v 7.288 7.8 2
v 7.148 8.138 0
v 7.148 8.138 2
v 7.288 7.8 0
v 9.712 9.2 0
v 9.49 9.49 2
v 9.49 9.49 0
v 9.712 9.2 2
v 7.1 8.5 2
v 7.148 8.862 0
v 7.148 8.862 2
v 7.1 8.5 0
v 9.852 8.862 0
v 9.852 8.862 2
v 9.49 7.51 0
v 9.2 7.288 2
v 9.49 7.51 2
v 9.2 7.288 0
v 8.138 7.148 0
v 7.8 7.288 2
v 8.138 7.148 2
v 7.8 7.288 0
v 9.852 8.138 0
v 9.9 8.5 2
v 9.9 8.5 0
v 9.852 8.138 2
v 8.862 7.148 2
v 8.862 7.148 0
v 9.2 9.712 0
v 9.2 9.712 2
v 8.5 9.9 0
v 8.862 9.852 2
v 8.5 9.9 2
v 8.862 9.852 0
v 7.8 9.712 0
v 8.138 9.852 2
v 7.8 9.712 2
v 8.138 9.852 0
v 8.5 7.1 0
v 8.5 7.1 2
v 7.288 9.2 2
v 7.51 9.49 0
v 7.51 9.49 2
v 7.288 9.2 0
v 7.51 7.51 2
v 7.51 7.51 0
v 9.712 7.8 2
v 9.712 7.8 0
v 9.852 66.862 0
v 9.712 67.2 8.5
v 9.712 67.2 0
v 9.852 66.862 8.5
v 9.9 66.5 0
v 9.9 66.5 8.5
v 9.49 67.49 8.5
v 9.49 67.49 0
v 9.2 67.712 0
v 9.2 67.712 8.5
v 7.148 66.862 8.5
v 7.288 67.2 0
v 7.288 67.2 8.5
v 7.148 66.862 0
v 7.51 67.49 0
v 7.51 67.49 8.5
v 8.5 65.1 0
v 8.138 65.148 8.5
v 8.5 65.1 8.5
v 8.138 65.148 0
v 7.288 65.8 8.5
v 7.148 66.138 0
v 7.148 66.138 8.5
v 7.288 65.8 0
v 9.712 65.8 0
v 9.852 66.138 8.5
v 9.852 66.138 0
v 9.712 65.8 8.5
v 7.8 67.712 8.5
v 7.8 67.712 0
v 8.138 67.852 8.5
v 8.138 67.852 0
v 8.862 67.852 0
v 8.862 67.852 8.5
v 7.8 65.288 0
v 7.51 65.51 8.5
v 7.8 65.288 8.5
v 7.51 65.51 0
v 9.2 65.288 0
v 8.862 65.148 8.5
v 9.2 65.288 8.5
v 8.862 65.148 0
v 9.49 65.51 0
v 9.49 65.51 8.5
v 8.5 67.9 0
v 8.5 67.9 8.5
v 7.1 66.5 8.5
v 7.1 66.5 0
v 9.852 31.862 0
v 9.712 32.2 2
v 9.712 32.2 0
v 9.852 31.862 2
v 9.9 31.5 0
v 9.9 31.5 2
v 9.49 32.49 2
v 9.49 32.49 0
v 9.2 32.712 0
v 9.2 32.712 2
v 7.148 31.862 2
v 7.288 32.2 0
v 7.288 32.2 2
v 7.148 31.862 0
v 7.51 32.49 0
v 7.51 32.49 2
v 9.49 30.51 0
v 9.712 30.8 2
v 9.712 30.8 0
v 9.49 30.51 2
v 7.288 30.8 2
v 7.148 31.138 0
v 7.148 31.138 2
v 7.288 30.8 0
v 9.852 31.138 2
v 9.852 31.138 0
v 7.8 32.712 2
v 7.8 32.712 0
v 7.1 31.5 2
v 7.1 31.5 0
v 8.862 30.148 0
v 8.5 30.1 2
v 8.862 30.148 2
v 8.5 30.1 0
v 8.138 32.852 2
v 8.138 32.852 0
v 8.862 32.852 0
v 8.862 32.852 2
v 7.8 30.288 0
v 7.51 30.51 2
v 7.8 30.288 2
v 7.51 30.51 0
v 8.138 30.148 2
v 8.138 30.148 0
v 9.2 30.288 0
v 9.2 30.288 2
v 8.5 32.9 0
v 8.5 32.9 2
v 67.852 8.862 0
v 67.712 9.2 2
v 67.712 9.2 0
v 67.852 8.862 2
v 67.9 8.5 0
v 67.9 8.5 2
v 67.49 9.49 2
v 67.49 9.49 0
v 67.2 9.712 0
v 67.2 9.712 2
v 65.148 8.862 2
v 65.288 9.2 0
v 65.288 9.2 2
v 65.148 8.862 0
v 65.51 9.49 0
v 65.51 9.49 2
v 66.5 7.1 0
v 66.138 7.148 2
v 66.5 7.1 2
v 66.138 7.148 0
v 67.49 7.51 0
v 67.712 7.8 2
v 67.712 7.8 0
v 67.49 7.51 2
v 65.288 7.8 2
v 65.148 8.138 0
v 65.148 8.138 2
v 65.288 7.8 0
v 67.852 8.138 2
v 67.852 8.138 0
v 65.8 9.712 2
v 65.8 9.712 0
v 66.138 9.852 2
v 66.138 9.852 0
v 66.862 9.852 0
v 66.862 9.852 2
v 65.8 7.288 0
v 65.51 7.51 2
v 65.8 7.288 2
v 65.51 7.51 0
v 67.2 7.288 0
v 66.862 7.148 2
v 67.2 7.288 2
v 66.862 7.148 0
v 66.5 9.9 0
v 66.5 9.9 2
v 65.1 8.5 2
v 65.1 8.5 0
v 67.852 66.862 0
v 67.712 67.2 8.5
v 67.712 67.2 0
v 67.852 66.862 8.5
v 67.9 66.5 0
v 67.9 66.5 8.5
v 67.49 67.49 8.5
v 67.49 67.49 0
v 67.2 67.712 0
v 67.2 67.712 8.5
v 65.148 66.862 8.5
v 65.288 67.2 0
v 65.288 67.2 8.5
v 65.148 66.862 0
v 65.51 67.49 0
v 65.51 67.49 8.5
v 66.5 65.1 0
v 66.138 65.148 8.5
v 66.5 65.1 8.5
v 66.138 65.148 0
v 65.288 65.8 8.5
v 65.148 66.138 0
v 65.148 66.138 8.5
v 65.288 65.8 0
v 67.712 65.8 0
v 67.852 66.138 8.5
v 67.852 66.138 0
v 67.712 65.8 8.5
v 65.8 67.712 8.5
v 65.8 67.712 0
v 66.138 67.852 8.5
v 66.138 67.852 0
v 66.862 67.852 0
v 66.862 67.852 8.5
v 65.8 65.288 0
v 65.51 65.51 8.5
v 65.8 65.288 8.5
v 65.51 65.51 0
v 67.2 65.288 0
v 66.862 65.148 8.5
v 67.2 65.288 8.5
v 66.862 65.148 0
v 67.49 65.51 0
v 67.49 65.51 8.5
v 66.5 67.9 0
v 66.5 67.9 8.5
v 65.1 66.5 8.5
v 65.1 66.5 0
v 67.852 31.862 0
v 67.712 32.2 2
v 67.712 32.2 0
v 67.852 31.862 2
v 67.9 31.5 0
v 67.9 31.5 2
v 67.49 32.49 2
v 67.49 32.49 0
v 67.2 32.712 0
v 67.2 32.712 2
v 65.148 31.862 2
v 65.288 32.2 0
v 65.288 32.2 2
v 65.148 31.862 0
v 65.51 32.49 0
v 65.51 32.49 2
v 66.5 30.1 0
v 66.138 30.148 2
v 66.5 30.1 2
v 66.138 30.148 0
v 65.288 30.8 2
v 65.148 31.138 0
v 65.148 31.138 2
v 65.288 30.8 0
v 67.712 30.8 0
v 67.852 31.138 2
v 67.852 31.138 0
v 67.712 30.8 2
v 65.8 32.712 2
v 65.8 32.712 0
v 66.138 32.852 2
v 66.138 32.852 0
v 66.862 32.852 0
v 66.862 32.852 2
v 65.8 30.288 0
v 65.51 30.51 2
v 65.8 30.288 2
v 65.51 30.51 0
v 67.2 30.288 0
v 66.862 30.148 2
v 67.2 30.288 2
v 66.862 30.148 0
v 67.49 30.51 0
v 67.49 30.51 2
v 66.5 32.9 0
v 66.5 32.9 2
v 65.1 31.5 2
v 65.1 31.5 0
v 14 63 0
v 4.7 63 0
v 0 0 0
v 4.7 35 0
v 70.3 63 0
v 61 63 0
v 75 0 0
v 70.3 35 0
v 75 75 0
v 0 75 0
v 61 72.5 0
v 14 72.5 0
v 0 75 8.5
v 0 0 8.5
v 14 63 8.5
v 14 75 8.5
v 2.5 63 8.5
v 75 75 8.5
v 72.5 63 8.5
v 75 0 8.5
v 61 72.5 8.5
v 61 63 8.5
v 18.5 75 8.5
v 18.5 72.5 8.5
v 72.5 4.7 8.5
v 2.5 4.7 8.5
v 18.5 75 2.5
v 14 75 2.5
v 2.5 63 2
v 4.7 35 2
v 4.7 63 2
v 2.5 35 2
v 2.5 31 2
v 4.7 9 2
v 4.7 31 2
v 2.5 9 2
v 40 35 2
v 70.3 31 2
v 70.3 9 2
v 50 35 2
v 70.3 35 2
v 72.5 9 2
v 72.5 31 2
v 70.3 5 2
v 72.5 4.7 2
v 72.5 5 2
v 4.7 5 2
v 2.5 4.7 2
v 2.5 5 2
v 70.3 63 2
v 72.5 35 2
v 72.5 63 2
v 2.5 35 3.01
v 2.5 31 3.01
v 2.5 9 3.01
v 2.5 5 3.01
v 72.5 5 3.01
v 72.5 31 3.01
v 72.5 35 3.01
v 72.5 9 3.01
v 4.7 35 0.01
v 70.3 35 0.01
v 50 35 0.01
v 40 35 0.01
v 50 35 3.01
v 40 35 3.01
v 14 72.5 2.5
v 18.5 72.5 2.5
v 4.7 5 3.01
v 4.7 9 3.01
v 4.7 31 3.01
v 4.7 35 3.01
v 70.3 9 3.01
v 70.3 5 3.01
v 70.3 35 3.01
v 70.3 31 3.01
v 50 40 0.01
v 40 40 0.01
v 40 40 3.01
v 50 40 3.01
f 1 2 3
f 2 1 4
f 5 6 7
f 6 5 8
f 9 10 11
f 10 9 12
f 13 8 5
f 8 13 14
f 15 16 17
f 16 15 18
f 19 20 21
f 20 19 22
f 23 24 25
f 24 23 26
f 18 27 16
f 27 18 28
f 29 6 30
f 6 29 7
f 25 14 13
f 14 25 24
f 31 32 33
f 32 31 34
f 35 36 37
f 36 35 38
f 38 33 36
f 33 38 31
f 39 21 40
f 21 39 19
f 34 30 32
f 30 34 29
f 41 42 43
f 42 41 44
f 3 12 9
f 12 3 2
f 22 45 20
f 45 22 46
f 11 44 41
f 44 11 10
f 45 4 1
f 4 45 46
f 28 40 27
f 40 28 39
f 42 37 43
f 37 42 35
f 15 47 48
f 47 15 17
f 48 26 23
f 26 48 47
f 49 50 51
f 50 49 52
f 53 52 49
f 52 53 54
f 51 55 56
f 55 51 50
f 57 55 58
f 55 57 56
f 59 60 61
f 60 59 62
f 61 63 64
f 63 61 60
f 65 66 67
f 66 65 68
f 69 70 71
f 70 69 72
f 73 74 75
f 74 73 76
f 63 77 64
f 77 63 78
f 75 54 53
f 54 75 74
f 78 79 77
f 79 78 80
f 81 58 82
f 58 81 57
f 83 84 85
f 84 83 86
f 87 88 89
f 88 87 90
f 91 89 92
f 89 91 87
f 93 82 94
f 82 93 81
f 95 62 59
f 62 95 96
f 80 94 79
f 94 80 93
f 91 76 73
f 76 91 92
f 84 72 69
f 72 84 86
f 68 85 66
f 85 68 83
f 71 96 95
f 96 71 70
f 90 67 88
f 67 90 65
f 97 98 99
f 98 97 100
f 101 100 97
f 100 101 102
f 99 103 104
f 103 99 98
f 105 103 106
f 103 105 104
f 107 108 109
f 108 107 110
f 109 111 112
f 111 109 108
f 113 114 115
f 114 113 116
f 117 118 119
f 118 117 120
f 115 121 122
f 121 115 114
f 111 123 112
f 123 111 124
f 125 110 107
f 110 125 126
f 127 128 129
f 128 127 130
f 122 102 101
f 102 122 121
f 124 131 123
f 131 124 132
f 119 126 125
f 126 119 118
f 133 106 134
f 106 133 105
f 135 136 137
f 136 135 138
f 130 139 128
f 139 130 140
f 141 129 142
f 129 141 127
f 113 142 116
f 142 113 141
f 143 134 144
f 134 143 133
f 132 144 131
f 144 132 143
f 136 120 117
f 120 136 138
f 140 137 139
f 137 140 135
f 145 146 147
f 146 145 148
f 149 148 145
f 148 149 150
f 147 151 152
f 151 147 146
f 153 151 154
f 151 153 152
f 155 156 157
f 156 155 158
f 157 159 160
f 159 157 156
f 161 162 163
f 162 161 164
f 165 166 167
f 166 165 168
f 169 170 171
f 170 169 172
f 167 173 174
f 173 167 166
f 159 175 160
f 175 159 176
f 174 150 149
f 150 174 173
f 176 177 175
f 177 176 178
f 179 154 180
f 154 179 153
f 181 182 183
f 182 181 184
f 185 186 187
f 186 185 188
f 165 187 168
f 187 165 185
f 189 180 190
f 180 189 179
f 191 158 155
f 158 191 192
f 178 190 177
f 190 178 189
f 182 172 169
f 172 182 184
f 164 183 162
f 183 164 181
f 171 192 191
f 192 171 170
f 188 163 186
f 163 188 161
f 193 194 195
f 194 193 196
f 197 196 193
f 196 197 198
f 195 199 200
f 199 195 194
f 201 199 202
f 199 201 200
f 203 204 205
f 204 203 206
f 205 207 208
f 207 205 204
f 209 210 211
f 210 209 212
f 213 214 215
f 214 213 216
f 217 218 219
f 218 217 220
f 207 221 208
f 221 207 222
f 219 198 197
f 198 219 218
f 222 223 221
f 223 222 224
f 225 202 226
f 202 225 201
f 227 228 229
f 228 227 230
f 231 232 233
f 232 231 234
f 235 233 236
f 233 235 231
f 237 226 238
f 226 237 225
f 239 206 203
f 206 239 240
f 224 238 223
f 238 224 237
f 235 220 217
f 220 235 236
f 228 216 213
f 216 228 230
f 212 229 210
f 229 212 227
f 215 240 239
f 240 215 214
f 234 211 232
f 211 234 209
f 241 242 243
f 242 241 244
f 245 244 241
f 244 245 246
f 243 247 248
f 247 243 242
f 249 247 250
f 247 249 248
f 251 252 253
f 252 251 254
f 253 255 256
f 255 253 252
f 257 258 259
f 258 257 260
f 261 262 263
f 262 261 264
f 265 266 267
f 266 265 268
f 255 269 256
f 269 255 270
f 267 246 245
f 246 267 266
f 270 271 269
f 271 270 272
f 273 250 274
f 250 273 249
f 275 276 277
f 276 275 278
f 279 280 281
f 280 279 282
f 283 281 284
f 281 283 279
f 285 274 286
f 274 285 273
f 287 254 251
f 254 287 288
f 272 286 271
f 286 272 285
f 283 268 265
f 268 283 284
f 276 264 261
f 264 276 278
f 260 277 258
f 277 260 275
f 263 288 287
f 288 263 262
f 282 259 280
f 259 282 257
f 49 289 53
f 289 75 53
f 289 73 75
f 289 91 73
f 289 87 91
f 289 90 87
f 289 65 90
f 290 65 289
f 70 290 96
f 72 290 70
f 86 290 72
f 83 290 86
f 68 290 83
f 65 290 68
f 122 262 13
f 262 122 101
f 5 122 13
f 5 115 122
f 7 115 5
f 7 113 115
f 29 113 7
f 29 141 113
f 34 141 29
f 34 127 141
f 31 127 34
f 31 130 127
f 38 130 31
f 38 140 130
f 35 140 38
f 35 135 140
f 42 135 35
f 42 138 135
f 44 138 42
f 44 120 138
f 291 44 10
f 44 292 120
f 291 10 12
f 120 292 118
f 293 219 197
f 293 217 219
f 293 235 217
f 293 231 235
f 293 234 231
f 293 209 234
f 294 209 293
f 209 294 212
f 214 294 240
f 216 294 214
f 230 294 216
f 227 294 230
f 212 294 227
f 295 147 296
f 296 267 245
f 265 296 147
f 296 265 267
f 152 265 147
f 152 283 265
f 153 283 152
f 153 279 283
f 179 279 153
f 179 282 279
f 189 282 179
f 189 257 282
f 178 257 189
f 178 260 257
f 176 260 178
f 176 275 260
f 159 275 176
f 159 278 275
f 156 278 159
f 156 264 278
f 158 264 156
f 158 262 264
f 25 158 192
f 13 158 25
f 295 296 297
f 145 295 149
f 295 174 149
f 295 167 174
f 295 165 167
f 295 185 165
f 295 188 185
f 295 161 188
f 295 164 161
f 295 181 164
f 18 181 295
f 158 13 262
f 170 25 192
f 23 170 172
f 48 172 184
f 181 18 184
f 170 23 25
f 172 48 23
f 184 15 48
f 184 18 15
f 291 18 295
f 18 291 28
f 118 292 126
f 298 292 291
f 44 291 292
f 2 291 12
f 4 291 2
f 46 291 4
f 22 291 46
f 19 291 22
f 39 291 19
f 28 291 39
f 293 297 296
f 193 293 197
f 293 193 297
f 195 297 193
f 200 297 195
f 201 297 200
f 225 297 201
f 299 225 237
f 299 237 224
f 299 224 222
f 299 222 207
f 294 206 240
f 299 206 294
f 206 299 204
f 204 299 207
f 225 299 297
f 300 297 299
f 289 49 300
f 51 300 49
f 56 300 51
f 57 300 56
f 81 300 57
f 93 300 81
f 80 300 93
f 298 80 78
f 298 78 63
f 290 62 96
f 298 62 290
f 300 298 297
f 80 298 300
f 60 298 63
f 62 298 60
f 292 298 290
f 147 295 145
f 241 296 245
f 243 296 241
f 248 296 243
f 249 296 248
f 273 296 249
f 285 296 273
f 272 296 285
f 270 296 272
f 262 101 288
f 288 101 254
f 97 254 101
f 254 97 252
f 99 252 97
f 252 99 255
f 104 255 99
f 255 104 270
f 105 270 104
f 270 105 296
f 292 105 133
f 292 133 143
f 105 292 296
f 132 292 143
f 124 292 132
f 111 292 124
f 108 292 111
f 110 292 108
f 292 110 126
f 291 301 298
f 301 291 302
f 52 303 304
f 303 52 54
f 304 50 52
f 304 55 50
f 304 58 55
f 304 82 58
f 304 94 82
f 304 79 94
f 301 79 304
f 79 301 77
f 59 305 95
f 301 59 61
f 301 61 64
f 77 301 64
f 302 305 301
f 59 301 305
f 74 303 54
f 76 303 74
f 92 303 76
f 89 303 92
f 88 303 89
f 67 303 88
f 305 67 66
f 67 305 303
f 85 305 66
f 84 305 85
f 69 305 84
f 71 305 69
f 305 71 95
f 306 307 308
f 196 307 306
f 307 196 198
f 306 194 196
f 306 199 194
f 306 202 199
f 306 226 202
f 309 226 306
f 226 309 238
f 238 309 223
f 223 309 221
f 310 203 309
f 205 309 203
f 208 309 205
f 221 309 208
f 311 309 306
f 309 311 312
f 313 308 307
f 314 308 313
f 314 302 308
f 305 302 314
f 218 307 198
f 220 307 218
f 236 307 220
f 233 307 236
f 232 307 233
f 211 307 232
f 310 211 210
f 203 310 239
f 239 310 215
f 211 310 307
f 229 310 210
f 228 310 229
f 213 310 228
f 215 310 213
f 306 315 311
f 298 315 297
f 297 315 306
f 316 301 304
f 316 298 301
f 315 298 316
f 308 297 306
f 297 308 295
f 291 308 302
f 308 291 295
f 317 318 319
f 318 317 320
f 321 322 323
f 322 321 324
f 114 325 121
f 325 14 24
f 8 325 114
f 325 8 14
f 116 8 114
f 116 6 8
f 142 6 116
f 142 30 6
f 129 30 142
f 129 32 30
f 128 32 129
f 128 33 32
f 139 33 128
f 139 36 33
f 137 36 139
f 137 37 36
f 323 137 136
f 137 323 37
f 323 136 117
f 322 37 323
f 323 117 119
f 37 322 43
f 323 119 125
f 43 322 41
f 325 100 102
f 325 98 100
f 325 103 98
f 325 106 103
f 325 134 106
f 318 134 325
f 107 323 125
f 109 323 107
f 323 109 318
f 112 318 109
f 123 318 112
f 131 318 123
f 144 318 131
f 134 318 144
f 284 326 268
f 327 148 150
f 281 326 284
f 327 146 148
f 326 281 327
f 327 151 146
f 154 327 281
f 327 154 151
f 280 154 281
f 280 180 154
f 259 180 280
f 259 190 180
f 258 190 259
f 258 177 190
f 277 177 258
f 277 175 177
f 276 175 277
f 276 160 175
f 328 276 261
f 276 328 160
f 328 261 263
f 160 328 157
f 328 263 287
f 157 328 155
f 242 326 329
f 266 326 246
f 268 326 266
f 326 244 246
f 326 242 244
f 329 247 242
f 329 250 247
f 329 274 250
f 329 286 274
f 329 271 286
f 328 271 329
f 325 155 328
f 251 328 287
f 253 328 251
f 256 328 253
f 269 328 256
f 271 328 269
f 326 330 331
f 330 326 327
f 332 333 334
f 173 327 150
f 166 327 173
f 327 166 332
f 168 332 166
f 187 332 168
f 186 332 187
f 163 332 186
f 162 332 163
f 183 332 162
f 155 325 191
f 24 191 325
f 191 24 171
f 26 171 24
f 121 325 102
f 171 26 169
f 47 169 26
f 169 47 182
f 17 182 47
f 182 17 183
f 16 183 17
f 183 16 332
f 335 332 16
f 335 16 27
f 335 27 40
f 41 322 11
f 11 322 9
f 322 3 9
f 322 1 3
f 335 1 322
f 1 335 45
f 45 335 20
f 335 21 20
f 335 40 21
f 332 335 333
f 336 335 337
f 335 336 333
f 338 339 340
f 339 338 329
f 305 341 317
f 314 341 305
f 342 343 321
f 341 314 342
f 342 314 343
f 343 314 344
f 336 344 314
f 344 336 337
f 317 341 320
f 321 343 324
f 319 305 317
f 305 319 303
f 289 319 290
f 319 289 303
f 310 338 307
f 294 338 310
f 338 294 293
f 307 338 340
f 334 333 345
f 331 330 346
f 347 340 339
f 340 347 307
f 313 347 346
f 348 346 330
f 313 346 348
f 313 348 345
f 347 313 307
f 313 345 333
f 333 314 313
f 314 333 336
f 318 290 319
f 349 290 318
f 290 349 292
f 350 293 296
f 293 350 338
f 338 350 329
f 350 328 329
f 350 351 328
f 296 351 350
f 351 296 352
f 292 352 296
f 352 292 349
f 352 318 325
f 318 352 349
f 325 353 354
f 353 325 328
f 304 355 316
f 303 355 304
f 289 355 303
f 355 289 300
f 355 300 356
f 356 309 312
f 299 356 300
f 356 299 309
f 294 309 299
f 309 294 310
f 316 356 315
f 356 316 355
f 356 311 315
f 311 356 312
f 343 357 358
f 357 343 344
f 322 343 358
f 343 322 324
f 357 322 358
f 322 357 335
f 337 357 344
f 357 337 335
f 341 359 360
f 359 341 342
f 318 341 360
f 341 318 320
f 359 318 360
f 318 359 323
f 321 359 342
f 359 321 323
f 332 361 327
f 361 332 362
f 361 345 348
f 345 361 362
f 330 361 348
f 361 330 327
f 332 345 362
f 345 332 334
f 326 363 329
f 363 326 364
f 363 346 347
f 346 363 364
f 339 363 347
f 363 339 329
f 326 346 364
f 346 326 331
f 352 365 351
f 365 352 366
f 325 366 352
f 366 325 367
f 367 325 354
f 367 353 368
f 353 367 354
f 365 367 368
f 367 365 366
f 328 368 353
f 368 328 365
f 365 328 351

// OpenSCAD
$fn=24;
ps = 0.01;

mw = 65;
mh = 30;
mhw = 58;
mhh = 23;

device_mgn = 0.3;

width = 75;
mgn = (width - mhw) / 2.0;

hole = 2.5 + 0.3;
top_hole = 4.5;
hex_size = 6;
hex_nut_height = 2.5;

plate_height = 2;
wall_height = 6.5;
total_height = plate_height + wall_height;

top_margin = mgn - (mw - mhw) / 2;
wall_width = 2.5;

parts_space_depth = 0;
parts_space_top_height = 28;
parts_space_bottom_x = 9;

pp = width - mh - top_margin - wall_width;

stopper_width = 3;
stopper_height = 4;
stopper_depth = 1;
bottom_stopper_width = 10;
bottom_stopper_height = 5;
bottom_stopper_x = 40;

usb_hole_x = 14.0;
usb_hole_width = 4.5;
usb_hole_depth = 6;

union() {
    difference() {
        //box
        translate([0, 0, 0]){
            linear_extrude(total_height)
            square([width, width]);
        }
        translate([wall_width, top_margin - device_mgn, plate_height]){
            linear_extrude(total_height - plate_height + ps)
            square([width - wall_width * 2, mh + parts_space_top_height + device_mgn]);
        }
        //box
        //parts_space
        translate([(width - mw)/2 - device_mgn, top_margin + mh, parts_space_depth]){
            linear_extrude(total_height - plate_height + ps)
            square([mw + device_mgn * 2, parts_space_top_height]);
        }

        //parts_space_bottom
        translate([(width - mw)/2 + parts_space_bottom_x, top_margin + mh, parts_space_depth]){
            linear_extrude(total_height)
            square([mw - parts_space_bottom_x * 2, pp]);
        }

        //hole
        for(x = [mgn, width-mgn]){
            for(y = [mgn, width-mgn, mgn + mhh]) {
                hex_hole(x,y);
            }
        }
        //usb out
        translate([usb_hole_x, width - wall_width - ps, total_height - usb_hole_depth]){
            linear_extrude(usb_hole_depth + ps)
            square([usb_hole_width, wall_width + ps * 2]);
        }
    }

    translate([bottom_stopper_x, top_margin + mh, ps]){
        linear_extrude(plate_height + stopper_depth)
        square([bottom_stopper_width, bottom_stopper_height]);
    }
    for(x = [(width - mw)/ 2 - stopper_width - device_mgn, width - (width - mw)/ 2 + device_mgn]) {
        for(y = [top_margin,  top_margin + mh - stopper_height]) {
            translate([x, y, ps]){
                linear_extrude(plate_height + stopper_depth)
                square([stopper_width, stopper_height]);
            }
        }
    }
}

module hex_hole(x,y) {
    translate([x, y,-ps])
        cylinder( d = hole, h = total_height + ps * 2);
}
